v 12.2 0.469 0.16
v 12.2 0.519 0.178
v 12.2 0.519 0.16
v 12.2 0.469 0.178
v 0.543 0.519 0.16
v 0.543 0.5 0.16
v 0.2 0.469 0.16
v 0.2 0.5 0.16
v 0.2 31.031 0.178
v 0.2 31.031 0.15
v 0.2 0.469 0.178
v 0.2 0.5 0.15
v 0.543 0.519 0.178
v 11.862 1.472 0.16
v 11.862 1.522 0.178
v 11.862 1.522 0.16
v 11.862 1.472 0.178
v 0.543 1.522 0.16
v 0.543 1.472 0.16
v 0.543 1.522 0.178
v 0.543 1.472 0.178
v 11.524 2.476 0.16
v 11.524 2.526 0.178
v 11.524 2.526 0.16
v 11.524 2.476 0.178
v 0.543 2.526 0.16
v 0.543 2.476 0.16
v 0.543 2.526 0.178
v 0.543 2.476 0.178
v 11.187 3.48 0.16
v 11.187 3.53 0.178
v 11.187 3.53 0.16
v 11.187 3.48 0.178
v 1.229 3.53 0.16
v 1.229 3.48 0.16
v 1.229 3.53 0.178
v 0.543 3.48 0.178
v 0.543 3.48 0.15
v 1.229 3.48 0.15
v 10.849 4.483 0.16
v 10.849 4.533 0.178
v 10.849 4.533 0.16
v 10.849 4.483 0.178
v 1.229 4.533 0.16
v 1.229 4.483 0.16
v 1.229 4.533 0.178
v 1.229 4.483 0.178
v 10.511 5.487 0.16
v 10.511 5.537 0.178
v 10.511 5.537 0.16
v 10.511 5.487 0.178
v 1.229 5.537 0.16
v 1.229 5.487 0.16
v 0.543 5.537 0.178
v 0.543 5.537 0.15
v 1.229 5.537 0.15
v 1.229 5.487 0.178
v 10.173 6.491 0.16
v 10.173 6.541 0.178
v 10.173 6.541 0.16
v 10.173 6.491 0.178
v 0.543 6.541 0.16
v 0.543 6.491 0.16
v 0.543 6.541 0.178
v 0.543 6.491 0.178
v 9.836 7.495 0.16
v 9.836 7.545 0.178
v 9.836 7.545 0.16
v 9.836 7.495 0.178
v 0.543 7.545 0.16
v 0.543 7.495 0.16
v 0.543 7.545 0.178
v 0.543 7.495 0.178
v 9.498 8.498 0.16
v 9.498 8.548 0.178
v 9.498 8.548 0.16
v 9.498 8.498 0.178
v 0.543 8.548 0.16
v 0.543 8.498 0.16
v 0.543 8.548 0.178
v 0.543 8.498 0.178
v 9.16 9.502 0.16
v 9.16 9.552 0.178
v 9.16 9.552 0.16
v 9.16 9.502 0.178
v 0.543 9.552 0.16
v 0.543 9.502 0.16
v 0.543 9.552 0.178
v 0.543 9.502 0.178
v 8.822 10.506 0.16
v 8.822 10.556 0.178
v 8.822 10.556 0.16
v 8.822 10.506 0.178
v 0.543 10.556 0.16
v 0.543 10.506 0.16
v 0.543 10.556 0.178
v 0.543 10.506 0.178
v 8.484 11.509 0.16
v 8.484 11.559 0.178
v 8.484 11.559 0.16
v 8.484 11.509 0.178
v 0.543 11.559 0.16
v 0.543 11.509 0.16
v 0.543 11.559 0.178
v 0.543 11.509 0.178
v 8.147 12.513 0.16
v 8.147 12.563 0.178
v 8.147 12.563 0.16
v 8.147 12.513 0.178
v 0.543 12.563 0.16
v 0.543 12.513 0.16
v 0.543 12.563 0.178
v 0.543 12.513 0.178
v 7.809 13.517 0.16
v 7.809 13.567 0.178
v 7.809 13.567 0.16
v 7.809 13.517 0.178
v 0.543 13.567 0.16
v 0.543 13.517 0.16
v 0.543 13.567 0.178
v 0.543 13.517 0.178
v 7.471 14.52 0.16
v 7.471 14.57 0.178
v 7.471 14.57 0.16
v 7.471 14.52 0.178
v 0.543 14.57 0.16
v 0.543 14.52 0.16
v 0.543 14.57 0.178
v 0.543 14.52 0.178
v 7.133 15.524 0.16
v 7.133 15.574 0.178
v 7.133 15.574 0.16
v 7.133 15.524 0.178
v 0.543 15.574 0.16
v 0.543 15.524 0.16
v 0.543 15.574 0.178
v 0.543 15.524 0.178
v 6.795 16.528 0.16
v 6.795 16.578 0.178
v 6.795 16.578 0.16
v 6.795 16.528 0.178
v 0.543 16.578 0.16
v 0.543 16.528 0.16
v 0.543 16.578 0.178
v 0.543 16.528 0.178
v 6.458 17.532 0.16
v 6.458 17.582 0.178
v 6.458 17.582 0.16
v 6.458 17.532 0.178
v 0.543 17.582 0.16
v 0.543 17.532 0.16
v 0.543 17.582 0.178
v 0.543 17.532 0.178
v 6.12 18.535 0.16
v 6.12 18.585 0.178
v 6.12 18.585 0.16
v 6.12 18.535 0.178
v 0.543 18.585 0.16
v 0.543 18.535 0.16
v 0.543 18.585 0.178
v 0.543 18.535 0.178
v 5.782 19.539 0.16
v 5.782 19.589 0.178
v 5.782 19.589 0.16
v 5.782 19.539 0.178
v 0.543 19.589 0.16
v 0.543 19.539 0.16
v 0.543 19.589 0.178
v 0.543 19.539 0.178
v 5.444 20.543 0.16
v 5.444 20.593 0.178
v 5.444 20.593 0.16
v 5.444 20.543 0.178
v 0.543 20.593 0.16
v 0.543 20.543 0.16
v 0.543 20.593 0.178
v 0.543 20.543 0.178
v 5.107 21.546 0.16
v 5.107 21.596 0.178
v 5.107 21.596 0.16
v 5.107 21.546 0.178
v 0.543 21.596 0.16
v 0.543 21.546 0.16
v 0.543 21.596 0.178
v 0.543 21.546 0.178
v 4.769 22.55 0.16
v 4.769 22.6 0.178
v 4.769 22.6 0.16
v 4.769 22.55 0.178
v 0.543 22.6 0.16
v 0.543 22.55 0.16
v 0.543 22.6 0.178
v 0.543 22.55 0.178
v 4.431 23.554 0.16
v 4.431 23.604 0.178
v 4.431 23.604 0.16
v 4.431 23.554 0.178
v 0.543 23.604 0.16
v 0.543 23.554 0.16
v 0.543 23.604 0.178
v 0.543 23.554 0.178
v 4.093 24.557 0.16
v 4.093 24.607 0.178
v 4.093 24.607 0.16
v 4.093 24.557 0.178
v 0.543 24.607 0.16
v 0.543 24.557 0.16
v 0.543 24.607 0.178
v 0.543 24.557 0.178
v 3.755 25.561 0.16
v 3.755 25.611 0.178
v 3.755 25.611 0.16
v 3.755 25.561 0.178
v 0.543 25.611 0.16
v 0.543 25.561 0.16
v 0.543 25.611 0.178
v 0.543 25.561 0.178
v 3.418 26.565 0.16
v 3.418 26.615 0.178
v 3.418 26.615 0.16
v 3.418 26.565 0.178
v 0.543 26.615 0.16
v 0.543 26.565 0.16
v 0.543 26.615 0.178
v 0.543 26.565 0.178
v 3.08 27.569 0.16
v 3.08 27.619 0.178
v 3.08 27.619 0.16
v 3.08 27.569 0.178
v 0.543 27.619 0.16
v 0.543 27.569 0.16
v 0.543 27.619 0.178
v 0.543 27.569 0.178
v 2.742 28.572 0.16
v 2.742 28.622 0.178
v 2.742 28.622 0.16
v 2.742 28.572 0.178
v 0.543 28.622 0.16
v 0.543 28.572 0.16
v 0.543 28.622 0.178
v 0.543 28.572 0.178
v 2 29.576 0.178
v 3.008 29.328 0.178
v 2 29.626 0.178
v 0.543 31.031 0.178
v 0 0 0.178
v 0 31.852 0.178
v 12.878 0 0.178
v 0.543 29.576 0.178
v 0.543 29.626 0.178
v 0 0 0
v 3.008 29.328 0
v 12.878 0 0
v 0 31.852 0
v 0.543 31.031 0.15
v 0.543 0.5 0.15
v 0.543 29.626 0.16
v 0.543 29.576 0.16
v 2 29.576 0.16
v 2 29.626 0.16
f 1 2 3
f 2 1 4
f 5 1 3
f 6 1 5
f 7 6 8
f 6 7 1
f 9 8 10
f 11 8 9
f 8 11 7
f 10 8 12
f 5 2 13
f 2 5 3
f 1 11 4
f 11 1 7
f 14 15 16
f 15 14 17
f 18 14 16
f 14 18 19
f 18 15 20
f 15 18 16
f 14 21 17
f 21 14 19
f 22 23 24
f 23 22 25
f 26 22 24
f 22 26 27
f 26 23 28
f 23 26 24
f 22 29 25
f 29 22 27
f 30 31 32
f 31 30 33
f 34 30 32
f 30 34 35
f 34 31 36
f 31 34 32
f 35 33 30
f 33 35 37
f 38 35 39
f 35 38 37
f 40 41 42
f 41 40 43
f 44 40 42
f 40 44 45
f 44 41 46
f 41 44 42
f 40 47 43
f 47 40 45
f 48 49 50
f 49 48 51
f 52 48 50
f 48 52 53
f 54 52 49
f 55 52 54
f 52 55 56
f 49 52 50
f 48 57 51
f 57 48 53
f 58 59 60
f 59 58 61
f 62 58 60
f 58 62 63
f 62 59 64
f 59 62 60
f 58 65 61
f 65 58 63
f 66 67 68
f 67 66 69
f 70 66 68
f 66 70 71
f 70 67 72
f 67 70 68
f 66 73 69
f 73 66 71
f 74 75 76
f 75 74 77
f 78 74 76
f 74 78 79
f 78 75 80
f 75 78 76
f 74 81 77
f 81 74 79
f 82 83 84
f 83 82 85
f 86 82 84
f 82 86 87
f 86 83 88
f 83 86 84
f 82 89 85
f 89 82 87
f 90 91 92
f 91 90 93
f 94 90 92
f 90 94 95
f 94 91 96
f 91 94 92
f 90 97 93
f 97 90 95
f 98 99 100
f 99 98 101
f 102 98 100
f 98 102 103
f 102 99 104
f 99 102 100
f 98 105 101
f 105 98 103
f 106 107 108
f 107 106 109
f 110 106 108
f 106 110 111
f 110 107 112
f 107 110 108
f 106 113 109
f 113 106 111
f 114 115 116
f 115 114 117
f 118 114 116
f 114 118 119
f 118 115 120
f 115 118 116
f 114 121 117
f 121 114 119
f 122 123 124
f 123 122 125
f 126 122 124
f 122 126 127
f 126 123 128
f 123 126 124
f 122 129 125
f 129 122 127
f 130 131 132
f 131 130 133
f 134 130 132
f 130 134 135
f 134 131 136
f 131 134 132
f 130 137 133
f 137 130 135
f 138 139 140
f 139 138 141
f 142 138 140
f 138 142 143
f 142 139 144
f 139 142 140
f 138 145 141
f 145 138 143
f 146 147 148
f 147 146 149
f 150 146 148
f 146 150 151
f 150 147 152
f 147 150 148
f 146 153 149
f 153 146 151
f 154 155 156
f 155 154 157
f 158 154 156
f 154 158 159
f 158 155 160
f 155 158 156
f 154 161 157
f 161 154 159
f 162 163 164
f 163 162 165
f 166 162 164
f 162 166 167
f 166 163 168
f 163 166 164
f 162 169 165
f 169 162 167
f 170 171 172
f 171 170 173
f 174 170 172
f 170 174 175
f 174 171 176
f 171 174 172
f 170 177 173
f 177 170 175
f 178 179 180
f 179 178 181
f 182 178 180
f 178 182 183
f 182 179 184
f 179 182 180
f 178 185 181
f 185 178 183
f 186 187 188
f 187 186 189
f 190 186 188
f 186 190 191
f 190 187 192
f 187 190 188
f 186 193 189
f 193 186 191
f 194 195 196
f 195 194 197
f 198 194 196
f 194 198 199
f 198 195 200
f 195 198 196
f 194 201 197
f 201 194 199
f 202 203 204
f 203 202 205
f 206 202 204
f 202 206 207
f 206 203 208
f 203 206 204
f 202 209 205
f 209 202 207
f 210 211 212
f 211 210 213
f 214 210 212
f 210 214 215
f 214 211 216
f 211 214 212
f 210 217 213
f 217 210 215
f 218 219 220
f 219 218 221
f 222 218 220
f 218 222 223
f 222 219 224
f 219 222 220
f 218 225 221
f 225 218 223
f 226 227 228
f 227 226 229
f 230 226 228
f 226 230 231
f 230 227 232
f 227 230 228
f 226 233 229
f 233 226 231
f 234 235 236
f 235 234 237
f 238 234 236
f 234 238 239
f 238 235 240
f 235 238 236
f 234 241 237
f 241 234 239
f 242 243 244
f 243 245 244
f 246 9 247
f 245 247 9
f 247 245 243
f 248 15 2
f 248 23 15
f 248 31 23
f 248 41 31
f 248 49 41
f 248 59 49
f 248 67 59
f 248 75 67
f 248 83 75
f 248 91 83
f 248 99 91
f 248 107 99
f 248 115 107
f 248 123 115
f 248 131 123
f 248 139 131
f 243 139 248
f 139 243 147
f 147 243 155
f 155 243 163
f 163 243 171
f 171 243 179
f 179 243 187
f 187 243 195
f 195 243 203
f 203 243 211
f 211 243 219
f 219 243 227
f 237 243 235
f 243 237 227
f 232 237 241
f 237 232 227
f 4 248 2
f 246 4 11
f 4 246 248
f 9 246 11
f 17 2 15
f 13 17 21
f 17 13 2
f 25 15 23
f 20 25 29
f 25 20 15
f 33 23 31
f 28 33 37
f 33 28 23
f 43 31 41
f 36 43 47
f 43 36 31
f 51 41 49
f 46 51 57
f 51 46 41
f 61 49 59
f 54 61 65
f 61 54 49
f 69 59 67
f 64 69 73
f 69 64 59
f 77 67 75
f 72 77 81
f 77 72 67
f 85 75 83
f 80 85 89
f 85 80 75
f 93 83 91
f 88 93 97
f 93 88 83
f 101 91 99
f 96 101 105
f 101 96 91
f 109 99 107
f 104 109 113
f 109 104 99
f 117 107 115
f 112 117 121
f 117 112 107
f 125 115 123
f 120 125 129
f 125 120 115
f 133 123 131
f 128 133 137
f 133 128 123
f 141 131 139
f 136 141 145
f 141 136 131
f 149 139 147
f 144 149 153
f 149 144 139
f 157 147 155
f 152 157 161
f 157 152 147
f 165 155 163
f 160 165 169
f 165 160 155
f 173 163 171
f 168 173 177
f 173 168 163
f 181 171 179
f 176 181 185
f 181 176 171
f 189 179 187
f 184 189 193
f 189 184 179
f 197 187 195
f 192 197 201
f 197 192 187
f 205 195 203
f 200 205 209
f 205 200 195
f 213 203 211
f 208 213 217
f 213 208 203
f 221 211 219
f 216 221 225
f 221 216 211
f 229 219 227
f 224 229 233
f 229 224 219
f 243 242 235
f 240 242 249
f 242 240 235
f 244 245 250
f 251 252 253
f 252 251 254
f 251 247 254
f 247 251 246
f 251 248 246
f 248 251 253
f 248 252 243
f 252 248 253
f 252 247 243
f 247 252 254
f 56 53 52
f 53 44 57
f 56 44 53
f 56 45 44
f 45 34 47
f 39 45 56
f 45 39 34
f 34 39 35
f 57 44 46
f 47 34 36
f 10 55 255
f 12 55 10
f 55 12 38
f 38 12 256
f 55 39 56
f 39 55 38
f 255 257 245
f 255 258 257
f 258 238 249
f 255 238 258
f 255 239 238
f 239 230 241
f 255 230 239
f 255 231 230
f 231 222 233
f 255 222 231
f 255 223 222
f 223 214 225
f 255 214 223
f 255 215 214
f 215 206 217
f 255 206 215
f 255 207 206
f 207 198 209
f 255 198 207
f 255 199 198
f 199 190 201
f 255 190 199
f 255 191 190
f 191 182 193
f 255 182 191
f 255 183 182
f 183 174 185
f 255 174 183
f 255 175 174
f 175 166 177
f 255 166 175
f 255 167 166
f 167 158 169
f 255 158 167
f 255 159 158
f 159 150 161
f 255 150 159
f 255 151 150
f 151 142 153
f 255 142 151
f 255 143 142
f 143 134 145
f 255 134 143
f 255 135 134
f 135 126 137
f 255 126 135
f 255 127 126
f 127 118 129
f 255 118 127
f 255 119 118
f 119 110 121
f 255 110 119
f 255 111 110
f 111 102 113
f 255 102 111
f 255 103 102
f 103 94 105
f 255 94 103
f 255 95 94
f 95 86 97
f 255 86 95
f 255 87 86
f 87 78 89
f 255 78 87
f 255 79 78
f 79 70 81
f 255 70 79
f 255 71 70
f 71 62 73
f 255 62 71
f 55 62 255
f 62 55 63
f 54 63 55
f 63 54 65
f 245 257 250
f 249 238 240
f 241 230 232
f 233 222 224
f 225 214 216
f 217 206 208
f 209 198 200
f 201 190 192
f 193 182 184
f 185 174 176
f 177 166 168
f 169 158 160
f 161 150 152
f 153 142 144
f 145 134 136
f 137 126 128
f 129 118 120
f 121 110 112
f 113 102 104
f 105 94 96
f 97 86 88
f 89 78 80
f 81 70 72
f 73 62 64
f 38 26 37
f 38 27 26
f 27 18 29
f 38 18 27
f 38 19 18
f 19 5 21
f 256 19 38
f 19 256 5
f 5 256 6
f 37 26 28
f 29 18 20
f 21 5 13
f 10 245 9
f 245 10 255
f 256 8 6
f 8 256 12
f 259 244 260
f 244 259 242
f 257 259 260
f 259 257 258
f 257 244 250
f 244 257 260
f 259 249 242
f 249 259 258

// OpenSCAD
/*
 * Creates a TASC Cell.
 *
 * Author: Ian McInerney
 * Created: July 1, 2013
 */



difference() {
	cube(size=[12.8778,31.8516,0.1778],center=false);
	
	// Make the semi-triangular shape
	translate([12.8778,0.0,-0.2])rotate([0.0,0.0,18.6])cube(size=[12.0,40.37442,0.4], center=false);
	translate([0.0,31.8516,-0.2])rotate([0.0,0.0,-40.0])cube([12.0,12.0,0.4], center=false);

	// Make the terminals on the top of the cell
	translate([0.2,3.4798,0.15])cube(size=[1.0287,2.0574,1.0], center=false);
	translate([0.2,0.5,0.15])cube(size=[0.3429,30.5308,1.0], center=false);


//	translate([0.2,0.4687,0.16])cube(size=[12.5,0.05,1.0], center=false);
//	translate([0.2,1.4724,0.16])cube(size=[12.0,0.05,1.0], center=false);
//	translate([0.2,2.4761,0.16])cube(size=[11.5,0.05,1.0], center=false);
//	translate([0.2,3.4798,0.16])cube(size=[11.0,0.05,1.0], center=false);
//	translate([0.2,4.4835,0.16])cube(size=[10.5,0.05,1.0], center=false);
//	translate([0.2,5.4872,0.16])cube(size=[10.0,0.05,1.0], center=false);

	for (i=[0:1:28]) {
		translate([0.2,i*1.0037+0.4687,0.16])cube(size=[12.0-i*0.3377823,0.05,1.0], center=false);
	}
	translate([0.2,29*1.0037+0.4687,0.16])cube(size=[1.8,0.05,1.0], center=false);
}

//1.0037
